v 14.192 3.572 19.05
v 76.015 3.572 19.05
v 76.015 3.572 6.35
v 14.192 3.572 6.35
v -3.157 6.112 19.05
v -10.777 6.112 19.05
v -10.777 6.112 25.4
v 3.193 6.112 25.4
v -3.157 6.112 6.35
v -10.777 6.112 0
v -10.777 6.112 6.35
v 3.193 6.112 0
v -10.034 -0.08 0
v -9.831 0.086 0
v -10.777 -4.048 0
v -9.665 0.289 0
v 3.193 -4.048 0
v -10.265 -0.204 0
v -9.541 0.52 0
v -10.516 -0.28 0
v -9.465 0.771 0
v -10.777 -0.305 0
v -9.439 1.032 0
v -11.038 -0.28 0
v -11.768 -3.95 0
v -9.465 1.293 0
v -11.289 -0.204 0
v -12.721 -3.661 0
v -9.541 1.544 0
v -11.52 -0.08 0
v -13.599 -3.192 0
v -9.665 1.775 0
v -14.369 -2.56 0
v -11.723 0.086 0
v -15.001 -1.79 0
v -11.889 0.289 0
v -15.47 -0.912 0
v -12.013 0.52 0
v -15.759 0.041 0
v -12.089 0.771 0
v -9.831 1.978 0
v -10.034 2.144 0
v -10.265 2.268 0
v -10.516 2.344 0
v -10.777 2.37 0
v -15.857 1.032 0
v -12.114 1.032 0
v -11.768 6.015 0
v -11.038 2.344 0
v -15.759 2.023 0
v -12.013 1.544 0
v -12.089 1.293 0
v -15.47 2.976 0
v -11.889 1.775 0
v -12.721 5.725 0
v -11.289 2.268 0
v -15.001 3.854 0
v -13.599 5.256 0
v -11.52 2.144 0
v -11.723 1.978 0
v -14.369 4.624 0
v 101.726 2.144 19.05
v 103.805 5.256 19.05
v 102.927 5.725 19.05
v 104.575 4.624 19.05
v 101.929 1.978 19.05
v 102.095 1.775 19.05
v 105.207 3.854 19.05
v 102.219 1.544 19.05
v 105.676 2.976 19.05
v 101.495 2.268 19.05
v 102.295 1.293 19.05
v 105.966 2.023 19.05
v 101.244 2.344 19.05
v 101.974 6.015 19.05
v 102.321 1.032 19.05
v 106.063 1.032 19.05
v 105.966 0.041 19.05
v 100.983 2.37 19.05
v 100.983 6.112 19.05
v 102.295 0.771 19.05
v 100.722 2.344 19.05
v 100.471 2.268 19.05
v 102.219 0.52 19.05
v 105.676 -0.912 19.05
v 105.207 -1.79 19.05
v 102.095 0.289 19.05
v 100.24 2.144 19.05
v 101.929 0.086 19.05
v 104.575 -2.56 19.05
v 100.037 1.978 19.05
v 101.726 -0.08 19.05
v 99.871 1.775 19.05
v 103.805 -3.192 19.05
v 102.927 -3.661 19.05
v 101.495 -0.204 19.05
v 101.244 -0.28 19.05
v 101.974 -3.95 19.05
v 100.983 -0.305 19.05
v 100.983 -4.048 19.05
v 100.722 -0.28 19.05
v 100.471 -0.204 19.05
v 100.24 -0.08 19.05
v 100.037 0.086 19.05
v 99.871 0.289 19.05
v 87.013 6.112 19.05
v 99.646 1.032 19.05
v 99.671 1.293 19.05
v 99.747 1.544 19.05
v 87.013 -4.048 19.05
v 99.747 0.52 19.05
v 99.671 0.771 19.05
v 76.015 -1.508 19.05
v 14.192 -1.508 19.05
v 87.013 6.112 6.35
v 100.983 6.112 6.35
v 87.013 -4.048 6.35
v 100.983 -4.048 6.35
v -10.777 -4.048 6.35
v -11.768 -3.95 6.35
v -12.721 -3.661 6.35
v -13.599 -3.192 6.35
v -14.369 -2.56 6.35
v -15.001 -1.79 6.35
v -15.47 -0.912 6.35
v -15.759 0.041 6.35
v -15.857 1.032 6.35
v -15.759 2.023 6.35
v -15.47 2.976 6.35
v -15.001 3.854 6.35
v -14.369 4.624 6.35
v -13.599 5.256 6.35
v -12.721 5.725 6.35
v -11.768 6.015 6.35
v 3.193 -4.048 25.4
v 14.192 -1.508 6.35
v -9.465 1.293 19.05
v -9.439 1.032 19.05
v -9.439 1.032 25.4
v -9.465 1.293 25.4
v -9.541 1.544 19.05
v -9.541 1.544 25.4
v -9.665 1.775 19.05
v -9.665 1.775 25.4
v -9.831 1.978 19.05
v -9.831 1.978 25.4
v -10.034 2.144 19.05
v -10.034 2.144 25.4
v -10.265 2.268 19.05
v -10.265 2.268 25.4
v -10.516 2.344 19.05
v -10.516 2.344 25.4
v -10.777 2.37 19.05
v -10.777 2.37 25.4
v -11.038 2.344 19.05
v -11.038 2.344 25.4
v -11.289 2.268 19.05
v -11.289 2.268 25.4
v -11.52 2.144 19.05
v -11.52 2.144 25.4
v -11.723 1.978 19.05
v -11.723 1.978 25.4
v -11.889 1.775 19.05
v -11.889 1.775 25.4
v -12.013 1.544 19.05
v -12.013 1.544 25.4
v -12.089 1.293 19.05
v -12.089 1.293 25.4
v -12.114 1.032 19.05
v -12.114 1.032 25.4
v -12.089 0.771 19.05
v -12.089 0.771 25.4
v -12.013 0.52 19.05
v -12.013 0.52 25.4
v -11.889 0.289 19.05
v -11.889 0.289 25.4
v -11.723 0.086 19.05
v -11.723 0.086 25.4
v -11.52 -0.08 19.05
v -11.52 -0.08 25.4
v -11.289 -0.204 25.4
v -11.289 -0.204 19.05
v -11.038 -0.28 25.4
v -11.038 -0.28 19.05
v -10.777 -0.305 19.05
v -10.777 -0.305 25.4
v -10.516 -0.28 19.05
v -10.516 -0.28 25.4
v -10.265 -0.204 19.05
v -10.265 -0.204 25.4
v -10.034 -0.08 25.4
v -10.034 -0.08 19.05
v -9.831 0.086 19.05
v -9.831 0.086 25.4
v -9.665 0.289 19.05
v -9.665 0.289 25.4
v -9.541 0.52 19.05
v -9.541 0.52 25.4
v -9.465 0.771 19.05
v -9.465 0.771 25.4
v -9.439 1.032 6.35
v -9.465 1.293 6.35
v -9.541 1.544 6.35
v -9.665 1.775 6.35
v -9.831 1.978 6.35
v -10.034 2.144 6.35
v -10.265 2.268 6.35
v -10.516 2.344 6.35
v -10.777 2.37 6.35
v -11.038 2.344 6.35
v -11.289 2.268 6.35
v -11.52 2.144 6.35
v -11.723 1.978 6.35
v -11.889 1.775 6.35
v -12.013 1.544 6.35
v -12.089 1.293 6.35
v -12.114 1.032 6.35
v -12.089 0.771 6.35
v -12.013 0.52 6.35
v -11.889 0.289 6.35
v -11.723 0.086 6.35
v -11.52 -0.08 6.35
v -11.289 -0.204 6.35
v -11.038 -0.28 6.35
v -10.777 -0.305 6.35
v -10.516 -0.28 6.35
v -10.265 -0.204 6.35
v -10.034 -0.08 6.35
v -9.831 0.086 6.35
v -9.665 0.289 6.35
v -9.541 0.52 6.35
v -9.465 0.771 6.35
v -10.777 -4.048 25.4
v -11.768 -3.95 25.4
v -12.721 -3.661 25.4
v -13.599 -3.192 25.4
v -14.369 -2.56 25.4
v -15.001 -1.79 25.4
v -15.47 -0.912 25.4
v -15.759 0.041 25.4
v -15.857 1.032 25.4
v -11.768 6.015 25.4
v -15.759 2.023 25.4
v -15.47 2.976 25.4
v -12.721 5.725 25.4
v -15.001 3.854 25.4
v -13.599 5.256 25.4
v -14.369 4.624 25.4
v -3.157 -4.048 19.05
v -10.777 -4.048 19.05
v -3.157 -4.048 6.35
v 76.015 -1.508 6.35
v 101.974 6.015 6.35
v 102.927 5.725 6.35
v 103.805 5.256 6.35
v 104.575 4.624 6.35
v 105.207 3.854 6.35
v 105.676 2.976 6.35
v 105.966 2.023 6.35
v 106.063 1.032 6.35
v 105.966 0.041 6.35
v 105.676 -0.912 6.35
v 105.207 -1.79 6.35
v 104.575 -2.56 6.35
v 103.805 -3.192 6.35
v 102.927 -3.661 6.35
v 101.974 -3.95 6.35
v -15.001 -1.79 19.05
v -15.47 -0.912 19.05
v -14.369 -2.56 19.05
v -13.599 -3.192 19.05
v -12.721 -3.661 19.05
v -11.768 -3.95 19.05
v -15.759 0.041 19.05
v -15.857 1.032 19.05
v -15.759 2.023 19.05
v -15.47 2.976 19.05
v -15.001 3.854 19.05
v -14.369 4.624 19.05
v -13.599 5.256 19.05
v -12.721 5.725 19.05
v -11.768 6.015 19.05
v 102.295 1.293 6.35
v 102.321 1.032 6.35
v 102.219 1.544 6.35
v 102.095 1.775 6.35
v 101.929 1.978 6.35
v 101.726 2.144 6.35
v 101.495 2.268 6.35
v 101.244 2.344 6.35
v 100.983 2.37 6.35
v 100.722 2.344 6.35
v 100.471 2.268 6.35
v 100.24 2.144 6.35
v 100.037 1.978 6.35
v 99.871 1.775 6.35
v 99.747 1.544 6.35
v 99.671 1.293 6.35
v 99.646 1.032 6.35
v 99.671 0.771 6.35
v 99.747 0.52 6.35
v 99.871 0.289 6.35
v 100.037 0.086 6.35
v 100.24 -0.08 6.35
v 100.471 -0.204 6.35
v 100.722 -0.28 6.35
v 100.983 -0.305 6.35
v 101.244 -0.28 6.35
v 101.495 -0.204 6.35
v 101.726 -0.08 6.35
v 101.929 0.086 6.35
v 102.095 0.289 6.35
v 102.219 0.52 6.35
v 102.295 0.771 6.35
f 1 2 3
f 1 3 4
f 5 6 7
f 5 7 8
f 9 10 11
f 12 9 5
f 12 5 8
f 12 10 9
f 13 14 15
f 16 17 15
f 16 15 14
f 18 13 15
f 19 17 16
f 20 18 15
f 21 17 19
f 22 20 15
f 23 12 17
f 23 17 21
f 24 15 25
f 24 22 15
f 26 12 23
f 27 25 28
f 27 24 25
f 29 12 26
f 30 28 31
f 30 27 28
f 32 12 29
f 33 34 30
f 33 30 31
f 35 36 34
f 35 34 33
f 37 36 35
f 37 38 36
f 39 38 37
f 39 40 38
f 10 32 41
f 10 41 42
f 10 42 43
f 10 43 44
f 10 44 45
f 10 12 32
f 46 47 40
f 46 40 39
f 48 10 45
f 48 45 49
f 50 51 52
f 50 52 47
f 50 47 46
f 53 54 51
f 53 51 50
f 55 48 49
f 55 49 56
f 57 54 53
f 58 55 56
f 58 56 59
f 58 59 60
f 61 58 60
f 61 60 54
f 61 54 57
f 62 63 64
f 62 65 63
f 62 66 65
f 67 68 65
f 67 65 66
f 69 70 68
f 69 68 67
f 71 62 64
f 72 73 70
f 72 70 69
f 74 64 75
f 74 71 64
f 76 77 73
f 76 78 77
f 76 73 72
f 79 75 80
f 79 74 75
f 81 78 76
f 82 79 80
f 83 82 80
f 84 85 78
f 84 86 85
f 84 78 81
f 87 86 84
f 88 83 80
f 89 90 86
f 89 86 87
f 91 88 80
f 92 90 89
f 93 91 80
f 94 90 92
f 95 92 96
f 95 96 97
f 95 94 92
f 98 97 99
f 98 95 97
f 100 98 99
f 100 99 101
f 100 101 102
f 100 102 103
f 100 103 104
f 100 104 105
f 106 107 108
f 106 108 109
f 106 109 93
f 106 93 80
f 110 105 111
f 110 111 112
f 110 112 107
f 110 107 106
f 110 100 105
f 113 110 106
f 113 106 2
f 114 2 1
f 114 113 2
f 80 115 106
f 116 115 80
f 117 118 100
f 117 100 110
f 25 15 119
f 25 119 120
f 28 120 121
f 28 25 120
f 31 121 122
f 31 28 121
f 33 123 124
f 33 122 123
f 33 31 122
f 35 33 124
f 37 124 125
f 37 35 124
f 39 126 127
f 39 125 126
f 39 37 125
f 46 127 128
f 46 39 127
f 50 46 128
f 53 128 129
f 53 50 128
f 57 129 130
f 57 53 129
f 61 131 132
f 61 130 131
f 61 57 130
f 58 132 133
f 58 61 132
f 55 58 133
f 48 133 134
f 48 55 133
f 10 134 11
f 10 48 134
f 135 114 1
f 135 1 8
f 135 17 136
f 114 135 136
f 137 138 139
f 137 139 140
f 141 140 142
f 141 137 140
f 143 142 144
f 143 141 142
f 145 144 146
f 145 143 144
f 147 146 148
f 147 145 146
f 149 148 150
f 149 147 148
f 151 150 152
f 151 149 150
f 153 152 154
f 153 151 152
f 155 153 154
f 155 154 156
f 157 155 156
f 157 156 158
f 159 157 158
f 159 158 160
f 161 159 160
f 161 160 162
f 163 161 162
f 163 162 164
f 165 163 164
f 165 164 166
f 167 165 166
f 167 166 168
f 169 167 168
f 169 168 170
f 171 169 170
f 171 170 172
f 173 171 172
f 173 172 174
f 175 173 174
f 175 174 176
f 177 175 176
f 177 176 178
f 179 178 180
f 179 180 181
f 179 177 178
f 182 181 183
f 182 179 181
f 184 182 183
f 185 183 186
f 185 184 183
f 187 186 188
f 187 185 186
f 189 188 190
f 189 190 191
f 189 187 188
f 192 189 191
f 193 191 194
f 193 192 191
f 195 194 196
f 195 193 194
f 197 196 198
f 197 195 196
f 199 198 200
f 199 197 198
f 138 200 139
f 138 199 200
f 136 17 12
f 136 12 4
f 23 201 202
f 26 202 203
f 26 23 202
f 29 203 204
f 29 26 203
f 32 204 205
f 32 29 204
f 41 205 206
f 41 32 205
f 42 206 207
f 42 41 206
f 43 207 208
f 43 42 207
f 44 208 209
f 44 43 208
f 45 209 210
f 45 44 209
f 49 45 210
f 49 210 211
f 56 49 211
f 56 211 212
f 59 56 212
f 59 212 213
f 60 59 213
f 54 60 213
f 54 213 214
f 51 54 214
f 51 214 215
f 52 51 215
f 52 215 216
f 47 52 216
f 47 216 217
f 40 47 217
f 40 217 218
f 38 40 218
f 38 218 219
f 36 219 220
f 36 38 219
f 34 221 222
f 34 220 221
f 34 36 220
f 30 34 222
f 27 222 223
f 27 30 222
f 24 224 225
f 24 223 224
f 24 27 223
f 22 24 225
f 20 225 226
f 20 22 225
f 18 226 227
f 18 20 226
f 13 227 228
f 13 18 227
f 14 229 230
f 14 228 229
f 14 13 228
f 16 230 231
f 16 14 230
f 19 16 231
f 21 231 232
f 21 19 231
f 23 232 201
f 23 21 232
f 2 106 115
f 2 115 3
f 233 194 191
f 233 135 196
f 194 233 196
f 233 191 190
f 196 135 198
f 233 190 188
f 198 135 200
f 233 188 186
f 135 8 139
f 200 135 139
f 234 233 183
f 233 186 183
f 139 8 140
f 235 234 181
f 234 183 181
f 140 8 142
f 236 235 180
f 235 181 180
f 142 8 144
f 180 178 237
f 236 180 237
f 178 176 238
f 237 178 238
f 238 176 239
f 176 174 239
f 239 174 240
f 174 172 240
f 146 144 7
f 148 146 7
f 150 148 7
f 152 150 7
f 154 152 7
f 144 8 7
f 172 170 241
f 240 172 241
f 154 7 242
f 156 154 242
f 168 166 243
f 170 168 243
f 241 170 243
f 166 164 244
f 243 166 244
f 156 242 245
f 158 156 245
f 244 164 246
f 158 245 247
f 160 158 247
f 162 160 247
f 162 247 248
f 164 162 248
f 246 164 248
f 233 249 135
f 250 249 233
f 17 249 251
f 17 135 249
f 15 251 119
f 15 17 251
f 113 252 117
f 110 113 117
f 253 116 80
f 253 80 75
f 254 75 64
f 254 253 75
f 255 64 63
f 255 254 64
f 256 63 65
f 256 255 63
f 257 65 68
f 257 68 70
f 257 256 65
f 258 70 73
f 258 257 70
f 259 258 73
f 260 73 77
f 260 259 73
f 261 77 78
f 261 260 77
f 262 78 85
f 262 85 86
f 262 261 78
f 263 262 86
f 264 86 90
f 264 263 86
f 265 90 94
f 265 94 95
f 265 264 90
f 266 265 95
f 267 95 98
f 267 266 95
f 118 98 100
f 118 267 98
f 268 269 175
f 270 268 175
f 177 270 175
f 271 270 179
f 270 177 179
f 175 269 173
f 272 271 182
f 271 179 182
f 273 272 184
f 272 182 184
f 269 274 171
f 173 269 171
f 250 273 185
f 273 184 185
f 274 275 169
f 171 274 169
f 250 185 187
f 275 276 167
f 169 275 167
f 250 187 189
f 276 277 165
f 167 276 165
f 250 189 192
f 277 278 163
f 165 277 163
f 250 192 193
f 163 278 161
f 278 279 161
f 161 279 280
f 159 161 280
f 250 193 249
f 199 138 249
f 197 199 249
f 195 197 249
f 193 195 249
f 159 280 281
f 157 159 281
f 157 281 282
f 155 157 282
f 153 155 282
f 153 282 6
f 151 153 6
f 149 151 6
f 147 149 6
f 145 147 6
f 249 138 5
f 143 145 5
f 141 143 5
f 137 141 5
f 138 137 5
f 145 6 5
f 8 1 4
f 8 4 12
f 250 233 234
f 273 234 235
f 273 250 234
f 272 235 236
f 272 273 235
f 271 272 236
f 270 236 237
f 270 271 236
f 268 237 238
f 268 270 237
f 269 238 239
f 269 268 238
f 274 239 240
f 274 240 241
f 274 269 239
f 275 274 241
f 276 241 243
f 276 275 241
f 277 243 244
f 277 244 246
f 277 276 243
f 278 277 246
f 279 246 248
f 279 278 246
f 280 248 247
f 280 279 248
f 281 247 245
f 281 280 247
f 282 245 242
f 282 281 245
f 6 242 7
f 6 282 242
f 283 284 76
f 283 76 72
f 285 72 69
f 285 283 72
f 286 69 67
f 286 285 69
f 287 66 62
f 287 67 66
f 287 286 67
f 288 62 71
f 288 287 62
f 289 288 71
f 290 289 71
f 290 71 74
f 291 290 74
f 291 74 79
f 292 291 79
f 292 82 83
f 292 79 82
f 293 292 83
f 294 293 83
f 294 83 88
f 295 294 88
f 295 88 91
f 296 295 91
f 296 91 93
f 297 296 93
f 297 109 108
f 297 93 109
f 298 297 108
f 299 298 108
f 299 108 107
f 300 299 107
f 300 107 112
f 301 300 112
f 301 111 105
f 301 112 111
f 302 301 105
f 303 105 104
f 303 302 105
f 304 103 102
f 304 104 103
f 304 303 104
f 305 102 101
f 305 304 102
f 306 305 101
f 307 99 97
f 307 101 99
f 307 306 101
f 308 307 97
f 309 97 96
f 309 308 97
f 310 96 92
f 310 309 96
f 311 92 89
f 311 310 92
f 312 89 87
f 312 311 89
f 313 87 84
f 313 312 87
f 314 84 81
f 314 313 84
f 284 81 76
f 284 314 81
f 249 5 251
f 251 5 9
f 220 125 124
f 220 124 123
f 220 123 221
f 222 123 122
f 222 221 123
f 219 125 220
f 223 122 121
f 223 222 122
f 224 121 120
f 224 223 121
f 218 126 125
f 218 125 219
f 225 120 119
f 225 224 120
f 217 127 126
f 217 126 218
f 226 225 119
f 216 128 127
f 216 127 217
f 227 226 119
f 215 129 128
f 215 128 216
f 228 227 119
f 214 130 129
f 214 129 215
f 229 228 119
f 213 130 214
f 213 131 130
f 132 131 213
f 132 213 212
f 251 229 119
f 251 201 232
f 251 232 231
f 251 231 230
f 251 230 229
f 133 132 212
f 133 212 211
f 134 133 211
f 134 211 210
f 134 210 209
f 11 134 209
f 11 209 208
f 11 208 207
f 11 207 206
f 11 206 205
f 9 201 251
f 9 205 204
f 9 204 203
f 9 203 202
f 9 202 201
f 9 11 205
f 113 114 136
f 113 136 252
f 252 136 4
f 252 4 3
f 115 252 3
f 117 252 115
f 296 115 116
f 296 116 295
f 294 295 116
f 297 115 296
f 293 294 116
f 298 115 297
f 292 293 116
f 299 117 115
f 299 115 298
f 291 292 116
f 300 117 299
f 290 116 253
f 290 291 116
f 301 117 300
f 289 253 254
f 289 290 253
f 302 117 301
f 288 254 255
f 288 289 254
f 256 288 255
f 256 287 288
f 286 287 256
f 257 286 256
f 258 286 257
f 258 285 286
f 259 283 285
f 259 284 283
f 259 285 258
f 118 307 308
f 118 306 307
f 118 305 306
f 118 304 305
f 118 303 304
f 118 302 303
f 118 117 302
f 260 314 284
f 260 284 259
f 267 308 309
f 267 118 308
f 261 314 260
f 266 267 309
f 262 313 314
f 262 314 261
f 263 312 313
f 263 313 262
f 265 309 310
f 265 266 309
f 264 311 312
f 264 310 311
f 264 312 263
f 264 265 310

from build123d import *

# Parameters (mm, degrees)
SKETCH2_R               = 1.3375
BOSS_EXTRUDE2_DEPTH     = 25.4
SKETCH4_W               = 12.7
SKETCH4_H               = 12.7
CUT_EXTRUDE2_DEPTH      = 12.7
CUT_EXTRUDE3_DEPTH      = 110.534359325
CUT_EXTRUDE3_DEPTH_BACK = 110.534359325
SKETCH5_W               = 5.08
SKETCH5_H               = 6.35
CUT_EXTRUDE7_DEPTH      = 110.233274388


with BuildPart() as part:
    # Sketch2 → Boss-Extrude2 (new body)
    with BuildSketch(Plane.XY):
        with BuildLine():
            Line((-10.776857143, 6.112115909), (100.983142857, 6.112115909))
            ThreePointArc((100.983142857, 6.112115909), (106.063142857, 1.032115909), (100.983142857, -4.047884091))
            Line((100.983142857, -4.047884091), (-10.776857143, -4.047884091))
            ThreePointArc((-10.776857143, -4.047884091), (-15.856857143, 1.032115909), (-10.776857143, 6.112115909))
        make_face()
        with Locations((-10.776857143, 1.032115909)):
            Circle(SKETCH2_R, mode=Mode.SUBTRACT)
        with Locations((100.983142857, 1.032115909)):
            Circle(SKETCH2_R, mode=Mode.SUBTRACT)
    extrude(amount=BOSS_EXTRUDE2_DEPTH)

    # Sketch4 → Cut-Extrude2 (cut)
    with BuildSketch(Plane(origin=(0, 6.112115909, 0), x_dir=(1, 0, 0), z_dir=(0, 1, 0))):
        with Locations((-9.506857143, -12.7)):
            Rectangle(SKETCH4_W, SKETCH4_H)
    extrude(amount=-CUT_EXTRUDE2_DEPTH, mode=Mode.SUBTRACT)

    # Sketch5 → Cut-Extrude3 (cut, two sides: drawn at the far end of the back side and taken through both)
    with BuildSketch(Plane(origin=(0, 6.112115909, 0), x_dir=(1, 0, 0), z_dir=(0, 1, 0)).offset(-CUT_EXTRUDE3_DEPTH_BACK)):
        Polygon((87.013142857, 0), (3.193142857, 0), (14.191665485, -6.35), (100.983142857, -6.35), (100.983142857, 0), align=None)
        Polygon((100.983142857, -25.4), (100.983142857, -19.05), (14.191665485, -19.05), (3.193142857, -25.4), (87.013142857, -25.4), align=None)
        with Locations((103.523142857, -22.225)):
            Rectangle(SKETCH5_W, SKETCH5_H)
        with Locations((103.523142857, -3.175)):
            Rectangle(SKETCH5_W, SKETCH5_H)
    extrude(amount=CUT_EXTRUDE3_DEPTH + CUT_EXTRUDE3_DEPTH_BACK, mode=Mode.SUBTRACT)

    # Sketch13 → Cut-Extrude7 (cut, through all)
    with BuildSketch(Plane.XY.offset(25.4)):
        Polygon((87.013142857, 6.112115909), (76.014620229, 3.572115909), (14.191665485, 3.572115909), (3.193142857, 6.112115909), align=None)
        Polygon((87.013142857, -4.047884091), (3.193142857, -4.047884091), (14.191665485, -1.507884091), (76.014620229, -1.507884091), align=None)
    extrude(amount=-CUT_EXTRUDE7_DEPTH, mode=Mode.SUBTRACT)


solid = part.part
